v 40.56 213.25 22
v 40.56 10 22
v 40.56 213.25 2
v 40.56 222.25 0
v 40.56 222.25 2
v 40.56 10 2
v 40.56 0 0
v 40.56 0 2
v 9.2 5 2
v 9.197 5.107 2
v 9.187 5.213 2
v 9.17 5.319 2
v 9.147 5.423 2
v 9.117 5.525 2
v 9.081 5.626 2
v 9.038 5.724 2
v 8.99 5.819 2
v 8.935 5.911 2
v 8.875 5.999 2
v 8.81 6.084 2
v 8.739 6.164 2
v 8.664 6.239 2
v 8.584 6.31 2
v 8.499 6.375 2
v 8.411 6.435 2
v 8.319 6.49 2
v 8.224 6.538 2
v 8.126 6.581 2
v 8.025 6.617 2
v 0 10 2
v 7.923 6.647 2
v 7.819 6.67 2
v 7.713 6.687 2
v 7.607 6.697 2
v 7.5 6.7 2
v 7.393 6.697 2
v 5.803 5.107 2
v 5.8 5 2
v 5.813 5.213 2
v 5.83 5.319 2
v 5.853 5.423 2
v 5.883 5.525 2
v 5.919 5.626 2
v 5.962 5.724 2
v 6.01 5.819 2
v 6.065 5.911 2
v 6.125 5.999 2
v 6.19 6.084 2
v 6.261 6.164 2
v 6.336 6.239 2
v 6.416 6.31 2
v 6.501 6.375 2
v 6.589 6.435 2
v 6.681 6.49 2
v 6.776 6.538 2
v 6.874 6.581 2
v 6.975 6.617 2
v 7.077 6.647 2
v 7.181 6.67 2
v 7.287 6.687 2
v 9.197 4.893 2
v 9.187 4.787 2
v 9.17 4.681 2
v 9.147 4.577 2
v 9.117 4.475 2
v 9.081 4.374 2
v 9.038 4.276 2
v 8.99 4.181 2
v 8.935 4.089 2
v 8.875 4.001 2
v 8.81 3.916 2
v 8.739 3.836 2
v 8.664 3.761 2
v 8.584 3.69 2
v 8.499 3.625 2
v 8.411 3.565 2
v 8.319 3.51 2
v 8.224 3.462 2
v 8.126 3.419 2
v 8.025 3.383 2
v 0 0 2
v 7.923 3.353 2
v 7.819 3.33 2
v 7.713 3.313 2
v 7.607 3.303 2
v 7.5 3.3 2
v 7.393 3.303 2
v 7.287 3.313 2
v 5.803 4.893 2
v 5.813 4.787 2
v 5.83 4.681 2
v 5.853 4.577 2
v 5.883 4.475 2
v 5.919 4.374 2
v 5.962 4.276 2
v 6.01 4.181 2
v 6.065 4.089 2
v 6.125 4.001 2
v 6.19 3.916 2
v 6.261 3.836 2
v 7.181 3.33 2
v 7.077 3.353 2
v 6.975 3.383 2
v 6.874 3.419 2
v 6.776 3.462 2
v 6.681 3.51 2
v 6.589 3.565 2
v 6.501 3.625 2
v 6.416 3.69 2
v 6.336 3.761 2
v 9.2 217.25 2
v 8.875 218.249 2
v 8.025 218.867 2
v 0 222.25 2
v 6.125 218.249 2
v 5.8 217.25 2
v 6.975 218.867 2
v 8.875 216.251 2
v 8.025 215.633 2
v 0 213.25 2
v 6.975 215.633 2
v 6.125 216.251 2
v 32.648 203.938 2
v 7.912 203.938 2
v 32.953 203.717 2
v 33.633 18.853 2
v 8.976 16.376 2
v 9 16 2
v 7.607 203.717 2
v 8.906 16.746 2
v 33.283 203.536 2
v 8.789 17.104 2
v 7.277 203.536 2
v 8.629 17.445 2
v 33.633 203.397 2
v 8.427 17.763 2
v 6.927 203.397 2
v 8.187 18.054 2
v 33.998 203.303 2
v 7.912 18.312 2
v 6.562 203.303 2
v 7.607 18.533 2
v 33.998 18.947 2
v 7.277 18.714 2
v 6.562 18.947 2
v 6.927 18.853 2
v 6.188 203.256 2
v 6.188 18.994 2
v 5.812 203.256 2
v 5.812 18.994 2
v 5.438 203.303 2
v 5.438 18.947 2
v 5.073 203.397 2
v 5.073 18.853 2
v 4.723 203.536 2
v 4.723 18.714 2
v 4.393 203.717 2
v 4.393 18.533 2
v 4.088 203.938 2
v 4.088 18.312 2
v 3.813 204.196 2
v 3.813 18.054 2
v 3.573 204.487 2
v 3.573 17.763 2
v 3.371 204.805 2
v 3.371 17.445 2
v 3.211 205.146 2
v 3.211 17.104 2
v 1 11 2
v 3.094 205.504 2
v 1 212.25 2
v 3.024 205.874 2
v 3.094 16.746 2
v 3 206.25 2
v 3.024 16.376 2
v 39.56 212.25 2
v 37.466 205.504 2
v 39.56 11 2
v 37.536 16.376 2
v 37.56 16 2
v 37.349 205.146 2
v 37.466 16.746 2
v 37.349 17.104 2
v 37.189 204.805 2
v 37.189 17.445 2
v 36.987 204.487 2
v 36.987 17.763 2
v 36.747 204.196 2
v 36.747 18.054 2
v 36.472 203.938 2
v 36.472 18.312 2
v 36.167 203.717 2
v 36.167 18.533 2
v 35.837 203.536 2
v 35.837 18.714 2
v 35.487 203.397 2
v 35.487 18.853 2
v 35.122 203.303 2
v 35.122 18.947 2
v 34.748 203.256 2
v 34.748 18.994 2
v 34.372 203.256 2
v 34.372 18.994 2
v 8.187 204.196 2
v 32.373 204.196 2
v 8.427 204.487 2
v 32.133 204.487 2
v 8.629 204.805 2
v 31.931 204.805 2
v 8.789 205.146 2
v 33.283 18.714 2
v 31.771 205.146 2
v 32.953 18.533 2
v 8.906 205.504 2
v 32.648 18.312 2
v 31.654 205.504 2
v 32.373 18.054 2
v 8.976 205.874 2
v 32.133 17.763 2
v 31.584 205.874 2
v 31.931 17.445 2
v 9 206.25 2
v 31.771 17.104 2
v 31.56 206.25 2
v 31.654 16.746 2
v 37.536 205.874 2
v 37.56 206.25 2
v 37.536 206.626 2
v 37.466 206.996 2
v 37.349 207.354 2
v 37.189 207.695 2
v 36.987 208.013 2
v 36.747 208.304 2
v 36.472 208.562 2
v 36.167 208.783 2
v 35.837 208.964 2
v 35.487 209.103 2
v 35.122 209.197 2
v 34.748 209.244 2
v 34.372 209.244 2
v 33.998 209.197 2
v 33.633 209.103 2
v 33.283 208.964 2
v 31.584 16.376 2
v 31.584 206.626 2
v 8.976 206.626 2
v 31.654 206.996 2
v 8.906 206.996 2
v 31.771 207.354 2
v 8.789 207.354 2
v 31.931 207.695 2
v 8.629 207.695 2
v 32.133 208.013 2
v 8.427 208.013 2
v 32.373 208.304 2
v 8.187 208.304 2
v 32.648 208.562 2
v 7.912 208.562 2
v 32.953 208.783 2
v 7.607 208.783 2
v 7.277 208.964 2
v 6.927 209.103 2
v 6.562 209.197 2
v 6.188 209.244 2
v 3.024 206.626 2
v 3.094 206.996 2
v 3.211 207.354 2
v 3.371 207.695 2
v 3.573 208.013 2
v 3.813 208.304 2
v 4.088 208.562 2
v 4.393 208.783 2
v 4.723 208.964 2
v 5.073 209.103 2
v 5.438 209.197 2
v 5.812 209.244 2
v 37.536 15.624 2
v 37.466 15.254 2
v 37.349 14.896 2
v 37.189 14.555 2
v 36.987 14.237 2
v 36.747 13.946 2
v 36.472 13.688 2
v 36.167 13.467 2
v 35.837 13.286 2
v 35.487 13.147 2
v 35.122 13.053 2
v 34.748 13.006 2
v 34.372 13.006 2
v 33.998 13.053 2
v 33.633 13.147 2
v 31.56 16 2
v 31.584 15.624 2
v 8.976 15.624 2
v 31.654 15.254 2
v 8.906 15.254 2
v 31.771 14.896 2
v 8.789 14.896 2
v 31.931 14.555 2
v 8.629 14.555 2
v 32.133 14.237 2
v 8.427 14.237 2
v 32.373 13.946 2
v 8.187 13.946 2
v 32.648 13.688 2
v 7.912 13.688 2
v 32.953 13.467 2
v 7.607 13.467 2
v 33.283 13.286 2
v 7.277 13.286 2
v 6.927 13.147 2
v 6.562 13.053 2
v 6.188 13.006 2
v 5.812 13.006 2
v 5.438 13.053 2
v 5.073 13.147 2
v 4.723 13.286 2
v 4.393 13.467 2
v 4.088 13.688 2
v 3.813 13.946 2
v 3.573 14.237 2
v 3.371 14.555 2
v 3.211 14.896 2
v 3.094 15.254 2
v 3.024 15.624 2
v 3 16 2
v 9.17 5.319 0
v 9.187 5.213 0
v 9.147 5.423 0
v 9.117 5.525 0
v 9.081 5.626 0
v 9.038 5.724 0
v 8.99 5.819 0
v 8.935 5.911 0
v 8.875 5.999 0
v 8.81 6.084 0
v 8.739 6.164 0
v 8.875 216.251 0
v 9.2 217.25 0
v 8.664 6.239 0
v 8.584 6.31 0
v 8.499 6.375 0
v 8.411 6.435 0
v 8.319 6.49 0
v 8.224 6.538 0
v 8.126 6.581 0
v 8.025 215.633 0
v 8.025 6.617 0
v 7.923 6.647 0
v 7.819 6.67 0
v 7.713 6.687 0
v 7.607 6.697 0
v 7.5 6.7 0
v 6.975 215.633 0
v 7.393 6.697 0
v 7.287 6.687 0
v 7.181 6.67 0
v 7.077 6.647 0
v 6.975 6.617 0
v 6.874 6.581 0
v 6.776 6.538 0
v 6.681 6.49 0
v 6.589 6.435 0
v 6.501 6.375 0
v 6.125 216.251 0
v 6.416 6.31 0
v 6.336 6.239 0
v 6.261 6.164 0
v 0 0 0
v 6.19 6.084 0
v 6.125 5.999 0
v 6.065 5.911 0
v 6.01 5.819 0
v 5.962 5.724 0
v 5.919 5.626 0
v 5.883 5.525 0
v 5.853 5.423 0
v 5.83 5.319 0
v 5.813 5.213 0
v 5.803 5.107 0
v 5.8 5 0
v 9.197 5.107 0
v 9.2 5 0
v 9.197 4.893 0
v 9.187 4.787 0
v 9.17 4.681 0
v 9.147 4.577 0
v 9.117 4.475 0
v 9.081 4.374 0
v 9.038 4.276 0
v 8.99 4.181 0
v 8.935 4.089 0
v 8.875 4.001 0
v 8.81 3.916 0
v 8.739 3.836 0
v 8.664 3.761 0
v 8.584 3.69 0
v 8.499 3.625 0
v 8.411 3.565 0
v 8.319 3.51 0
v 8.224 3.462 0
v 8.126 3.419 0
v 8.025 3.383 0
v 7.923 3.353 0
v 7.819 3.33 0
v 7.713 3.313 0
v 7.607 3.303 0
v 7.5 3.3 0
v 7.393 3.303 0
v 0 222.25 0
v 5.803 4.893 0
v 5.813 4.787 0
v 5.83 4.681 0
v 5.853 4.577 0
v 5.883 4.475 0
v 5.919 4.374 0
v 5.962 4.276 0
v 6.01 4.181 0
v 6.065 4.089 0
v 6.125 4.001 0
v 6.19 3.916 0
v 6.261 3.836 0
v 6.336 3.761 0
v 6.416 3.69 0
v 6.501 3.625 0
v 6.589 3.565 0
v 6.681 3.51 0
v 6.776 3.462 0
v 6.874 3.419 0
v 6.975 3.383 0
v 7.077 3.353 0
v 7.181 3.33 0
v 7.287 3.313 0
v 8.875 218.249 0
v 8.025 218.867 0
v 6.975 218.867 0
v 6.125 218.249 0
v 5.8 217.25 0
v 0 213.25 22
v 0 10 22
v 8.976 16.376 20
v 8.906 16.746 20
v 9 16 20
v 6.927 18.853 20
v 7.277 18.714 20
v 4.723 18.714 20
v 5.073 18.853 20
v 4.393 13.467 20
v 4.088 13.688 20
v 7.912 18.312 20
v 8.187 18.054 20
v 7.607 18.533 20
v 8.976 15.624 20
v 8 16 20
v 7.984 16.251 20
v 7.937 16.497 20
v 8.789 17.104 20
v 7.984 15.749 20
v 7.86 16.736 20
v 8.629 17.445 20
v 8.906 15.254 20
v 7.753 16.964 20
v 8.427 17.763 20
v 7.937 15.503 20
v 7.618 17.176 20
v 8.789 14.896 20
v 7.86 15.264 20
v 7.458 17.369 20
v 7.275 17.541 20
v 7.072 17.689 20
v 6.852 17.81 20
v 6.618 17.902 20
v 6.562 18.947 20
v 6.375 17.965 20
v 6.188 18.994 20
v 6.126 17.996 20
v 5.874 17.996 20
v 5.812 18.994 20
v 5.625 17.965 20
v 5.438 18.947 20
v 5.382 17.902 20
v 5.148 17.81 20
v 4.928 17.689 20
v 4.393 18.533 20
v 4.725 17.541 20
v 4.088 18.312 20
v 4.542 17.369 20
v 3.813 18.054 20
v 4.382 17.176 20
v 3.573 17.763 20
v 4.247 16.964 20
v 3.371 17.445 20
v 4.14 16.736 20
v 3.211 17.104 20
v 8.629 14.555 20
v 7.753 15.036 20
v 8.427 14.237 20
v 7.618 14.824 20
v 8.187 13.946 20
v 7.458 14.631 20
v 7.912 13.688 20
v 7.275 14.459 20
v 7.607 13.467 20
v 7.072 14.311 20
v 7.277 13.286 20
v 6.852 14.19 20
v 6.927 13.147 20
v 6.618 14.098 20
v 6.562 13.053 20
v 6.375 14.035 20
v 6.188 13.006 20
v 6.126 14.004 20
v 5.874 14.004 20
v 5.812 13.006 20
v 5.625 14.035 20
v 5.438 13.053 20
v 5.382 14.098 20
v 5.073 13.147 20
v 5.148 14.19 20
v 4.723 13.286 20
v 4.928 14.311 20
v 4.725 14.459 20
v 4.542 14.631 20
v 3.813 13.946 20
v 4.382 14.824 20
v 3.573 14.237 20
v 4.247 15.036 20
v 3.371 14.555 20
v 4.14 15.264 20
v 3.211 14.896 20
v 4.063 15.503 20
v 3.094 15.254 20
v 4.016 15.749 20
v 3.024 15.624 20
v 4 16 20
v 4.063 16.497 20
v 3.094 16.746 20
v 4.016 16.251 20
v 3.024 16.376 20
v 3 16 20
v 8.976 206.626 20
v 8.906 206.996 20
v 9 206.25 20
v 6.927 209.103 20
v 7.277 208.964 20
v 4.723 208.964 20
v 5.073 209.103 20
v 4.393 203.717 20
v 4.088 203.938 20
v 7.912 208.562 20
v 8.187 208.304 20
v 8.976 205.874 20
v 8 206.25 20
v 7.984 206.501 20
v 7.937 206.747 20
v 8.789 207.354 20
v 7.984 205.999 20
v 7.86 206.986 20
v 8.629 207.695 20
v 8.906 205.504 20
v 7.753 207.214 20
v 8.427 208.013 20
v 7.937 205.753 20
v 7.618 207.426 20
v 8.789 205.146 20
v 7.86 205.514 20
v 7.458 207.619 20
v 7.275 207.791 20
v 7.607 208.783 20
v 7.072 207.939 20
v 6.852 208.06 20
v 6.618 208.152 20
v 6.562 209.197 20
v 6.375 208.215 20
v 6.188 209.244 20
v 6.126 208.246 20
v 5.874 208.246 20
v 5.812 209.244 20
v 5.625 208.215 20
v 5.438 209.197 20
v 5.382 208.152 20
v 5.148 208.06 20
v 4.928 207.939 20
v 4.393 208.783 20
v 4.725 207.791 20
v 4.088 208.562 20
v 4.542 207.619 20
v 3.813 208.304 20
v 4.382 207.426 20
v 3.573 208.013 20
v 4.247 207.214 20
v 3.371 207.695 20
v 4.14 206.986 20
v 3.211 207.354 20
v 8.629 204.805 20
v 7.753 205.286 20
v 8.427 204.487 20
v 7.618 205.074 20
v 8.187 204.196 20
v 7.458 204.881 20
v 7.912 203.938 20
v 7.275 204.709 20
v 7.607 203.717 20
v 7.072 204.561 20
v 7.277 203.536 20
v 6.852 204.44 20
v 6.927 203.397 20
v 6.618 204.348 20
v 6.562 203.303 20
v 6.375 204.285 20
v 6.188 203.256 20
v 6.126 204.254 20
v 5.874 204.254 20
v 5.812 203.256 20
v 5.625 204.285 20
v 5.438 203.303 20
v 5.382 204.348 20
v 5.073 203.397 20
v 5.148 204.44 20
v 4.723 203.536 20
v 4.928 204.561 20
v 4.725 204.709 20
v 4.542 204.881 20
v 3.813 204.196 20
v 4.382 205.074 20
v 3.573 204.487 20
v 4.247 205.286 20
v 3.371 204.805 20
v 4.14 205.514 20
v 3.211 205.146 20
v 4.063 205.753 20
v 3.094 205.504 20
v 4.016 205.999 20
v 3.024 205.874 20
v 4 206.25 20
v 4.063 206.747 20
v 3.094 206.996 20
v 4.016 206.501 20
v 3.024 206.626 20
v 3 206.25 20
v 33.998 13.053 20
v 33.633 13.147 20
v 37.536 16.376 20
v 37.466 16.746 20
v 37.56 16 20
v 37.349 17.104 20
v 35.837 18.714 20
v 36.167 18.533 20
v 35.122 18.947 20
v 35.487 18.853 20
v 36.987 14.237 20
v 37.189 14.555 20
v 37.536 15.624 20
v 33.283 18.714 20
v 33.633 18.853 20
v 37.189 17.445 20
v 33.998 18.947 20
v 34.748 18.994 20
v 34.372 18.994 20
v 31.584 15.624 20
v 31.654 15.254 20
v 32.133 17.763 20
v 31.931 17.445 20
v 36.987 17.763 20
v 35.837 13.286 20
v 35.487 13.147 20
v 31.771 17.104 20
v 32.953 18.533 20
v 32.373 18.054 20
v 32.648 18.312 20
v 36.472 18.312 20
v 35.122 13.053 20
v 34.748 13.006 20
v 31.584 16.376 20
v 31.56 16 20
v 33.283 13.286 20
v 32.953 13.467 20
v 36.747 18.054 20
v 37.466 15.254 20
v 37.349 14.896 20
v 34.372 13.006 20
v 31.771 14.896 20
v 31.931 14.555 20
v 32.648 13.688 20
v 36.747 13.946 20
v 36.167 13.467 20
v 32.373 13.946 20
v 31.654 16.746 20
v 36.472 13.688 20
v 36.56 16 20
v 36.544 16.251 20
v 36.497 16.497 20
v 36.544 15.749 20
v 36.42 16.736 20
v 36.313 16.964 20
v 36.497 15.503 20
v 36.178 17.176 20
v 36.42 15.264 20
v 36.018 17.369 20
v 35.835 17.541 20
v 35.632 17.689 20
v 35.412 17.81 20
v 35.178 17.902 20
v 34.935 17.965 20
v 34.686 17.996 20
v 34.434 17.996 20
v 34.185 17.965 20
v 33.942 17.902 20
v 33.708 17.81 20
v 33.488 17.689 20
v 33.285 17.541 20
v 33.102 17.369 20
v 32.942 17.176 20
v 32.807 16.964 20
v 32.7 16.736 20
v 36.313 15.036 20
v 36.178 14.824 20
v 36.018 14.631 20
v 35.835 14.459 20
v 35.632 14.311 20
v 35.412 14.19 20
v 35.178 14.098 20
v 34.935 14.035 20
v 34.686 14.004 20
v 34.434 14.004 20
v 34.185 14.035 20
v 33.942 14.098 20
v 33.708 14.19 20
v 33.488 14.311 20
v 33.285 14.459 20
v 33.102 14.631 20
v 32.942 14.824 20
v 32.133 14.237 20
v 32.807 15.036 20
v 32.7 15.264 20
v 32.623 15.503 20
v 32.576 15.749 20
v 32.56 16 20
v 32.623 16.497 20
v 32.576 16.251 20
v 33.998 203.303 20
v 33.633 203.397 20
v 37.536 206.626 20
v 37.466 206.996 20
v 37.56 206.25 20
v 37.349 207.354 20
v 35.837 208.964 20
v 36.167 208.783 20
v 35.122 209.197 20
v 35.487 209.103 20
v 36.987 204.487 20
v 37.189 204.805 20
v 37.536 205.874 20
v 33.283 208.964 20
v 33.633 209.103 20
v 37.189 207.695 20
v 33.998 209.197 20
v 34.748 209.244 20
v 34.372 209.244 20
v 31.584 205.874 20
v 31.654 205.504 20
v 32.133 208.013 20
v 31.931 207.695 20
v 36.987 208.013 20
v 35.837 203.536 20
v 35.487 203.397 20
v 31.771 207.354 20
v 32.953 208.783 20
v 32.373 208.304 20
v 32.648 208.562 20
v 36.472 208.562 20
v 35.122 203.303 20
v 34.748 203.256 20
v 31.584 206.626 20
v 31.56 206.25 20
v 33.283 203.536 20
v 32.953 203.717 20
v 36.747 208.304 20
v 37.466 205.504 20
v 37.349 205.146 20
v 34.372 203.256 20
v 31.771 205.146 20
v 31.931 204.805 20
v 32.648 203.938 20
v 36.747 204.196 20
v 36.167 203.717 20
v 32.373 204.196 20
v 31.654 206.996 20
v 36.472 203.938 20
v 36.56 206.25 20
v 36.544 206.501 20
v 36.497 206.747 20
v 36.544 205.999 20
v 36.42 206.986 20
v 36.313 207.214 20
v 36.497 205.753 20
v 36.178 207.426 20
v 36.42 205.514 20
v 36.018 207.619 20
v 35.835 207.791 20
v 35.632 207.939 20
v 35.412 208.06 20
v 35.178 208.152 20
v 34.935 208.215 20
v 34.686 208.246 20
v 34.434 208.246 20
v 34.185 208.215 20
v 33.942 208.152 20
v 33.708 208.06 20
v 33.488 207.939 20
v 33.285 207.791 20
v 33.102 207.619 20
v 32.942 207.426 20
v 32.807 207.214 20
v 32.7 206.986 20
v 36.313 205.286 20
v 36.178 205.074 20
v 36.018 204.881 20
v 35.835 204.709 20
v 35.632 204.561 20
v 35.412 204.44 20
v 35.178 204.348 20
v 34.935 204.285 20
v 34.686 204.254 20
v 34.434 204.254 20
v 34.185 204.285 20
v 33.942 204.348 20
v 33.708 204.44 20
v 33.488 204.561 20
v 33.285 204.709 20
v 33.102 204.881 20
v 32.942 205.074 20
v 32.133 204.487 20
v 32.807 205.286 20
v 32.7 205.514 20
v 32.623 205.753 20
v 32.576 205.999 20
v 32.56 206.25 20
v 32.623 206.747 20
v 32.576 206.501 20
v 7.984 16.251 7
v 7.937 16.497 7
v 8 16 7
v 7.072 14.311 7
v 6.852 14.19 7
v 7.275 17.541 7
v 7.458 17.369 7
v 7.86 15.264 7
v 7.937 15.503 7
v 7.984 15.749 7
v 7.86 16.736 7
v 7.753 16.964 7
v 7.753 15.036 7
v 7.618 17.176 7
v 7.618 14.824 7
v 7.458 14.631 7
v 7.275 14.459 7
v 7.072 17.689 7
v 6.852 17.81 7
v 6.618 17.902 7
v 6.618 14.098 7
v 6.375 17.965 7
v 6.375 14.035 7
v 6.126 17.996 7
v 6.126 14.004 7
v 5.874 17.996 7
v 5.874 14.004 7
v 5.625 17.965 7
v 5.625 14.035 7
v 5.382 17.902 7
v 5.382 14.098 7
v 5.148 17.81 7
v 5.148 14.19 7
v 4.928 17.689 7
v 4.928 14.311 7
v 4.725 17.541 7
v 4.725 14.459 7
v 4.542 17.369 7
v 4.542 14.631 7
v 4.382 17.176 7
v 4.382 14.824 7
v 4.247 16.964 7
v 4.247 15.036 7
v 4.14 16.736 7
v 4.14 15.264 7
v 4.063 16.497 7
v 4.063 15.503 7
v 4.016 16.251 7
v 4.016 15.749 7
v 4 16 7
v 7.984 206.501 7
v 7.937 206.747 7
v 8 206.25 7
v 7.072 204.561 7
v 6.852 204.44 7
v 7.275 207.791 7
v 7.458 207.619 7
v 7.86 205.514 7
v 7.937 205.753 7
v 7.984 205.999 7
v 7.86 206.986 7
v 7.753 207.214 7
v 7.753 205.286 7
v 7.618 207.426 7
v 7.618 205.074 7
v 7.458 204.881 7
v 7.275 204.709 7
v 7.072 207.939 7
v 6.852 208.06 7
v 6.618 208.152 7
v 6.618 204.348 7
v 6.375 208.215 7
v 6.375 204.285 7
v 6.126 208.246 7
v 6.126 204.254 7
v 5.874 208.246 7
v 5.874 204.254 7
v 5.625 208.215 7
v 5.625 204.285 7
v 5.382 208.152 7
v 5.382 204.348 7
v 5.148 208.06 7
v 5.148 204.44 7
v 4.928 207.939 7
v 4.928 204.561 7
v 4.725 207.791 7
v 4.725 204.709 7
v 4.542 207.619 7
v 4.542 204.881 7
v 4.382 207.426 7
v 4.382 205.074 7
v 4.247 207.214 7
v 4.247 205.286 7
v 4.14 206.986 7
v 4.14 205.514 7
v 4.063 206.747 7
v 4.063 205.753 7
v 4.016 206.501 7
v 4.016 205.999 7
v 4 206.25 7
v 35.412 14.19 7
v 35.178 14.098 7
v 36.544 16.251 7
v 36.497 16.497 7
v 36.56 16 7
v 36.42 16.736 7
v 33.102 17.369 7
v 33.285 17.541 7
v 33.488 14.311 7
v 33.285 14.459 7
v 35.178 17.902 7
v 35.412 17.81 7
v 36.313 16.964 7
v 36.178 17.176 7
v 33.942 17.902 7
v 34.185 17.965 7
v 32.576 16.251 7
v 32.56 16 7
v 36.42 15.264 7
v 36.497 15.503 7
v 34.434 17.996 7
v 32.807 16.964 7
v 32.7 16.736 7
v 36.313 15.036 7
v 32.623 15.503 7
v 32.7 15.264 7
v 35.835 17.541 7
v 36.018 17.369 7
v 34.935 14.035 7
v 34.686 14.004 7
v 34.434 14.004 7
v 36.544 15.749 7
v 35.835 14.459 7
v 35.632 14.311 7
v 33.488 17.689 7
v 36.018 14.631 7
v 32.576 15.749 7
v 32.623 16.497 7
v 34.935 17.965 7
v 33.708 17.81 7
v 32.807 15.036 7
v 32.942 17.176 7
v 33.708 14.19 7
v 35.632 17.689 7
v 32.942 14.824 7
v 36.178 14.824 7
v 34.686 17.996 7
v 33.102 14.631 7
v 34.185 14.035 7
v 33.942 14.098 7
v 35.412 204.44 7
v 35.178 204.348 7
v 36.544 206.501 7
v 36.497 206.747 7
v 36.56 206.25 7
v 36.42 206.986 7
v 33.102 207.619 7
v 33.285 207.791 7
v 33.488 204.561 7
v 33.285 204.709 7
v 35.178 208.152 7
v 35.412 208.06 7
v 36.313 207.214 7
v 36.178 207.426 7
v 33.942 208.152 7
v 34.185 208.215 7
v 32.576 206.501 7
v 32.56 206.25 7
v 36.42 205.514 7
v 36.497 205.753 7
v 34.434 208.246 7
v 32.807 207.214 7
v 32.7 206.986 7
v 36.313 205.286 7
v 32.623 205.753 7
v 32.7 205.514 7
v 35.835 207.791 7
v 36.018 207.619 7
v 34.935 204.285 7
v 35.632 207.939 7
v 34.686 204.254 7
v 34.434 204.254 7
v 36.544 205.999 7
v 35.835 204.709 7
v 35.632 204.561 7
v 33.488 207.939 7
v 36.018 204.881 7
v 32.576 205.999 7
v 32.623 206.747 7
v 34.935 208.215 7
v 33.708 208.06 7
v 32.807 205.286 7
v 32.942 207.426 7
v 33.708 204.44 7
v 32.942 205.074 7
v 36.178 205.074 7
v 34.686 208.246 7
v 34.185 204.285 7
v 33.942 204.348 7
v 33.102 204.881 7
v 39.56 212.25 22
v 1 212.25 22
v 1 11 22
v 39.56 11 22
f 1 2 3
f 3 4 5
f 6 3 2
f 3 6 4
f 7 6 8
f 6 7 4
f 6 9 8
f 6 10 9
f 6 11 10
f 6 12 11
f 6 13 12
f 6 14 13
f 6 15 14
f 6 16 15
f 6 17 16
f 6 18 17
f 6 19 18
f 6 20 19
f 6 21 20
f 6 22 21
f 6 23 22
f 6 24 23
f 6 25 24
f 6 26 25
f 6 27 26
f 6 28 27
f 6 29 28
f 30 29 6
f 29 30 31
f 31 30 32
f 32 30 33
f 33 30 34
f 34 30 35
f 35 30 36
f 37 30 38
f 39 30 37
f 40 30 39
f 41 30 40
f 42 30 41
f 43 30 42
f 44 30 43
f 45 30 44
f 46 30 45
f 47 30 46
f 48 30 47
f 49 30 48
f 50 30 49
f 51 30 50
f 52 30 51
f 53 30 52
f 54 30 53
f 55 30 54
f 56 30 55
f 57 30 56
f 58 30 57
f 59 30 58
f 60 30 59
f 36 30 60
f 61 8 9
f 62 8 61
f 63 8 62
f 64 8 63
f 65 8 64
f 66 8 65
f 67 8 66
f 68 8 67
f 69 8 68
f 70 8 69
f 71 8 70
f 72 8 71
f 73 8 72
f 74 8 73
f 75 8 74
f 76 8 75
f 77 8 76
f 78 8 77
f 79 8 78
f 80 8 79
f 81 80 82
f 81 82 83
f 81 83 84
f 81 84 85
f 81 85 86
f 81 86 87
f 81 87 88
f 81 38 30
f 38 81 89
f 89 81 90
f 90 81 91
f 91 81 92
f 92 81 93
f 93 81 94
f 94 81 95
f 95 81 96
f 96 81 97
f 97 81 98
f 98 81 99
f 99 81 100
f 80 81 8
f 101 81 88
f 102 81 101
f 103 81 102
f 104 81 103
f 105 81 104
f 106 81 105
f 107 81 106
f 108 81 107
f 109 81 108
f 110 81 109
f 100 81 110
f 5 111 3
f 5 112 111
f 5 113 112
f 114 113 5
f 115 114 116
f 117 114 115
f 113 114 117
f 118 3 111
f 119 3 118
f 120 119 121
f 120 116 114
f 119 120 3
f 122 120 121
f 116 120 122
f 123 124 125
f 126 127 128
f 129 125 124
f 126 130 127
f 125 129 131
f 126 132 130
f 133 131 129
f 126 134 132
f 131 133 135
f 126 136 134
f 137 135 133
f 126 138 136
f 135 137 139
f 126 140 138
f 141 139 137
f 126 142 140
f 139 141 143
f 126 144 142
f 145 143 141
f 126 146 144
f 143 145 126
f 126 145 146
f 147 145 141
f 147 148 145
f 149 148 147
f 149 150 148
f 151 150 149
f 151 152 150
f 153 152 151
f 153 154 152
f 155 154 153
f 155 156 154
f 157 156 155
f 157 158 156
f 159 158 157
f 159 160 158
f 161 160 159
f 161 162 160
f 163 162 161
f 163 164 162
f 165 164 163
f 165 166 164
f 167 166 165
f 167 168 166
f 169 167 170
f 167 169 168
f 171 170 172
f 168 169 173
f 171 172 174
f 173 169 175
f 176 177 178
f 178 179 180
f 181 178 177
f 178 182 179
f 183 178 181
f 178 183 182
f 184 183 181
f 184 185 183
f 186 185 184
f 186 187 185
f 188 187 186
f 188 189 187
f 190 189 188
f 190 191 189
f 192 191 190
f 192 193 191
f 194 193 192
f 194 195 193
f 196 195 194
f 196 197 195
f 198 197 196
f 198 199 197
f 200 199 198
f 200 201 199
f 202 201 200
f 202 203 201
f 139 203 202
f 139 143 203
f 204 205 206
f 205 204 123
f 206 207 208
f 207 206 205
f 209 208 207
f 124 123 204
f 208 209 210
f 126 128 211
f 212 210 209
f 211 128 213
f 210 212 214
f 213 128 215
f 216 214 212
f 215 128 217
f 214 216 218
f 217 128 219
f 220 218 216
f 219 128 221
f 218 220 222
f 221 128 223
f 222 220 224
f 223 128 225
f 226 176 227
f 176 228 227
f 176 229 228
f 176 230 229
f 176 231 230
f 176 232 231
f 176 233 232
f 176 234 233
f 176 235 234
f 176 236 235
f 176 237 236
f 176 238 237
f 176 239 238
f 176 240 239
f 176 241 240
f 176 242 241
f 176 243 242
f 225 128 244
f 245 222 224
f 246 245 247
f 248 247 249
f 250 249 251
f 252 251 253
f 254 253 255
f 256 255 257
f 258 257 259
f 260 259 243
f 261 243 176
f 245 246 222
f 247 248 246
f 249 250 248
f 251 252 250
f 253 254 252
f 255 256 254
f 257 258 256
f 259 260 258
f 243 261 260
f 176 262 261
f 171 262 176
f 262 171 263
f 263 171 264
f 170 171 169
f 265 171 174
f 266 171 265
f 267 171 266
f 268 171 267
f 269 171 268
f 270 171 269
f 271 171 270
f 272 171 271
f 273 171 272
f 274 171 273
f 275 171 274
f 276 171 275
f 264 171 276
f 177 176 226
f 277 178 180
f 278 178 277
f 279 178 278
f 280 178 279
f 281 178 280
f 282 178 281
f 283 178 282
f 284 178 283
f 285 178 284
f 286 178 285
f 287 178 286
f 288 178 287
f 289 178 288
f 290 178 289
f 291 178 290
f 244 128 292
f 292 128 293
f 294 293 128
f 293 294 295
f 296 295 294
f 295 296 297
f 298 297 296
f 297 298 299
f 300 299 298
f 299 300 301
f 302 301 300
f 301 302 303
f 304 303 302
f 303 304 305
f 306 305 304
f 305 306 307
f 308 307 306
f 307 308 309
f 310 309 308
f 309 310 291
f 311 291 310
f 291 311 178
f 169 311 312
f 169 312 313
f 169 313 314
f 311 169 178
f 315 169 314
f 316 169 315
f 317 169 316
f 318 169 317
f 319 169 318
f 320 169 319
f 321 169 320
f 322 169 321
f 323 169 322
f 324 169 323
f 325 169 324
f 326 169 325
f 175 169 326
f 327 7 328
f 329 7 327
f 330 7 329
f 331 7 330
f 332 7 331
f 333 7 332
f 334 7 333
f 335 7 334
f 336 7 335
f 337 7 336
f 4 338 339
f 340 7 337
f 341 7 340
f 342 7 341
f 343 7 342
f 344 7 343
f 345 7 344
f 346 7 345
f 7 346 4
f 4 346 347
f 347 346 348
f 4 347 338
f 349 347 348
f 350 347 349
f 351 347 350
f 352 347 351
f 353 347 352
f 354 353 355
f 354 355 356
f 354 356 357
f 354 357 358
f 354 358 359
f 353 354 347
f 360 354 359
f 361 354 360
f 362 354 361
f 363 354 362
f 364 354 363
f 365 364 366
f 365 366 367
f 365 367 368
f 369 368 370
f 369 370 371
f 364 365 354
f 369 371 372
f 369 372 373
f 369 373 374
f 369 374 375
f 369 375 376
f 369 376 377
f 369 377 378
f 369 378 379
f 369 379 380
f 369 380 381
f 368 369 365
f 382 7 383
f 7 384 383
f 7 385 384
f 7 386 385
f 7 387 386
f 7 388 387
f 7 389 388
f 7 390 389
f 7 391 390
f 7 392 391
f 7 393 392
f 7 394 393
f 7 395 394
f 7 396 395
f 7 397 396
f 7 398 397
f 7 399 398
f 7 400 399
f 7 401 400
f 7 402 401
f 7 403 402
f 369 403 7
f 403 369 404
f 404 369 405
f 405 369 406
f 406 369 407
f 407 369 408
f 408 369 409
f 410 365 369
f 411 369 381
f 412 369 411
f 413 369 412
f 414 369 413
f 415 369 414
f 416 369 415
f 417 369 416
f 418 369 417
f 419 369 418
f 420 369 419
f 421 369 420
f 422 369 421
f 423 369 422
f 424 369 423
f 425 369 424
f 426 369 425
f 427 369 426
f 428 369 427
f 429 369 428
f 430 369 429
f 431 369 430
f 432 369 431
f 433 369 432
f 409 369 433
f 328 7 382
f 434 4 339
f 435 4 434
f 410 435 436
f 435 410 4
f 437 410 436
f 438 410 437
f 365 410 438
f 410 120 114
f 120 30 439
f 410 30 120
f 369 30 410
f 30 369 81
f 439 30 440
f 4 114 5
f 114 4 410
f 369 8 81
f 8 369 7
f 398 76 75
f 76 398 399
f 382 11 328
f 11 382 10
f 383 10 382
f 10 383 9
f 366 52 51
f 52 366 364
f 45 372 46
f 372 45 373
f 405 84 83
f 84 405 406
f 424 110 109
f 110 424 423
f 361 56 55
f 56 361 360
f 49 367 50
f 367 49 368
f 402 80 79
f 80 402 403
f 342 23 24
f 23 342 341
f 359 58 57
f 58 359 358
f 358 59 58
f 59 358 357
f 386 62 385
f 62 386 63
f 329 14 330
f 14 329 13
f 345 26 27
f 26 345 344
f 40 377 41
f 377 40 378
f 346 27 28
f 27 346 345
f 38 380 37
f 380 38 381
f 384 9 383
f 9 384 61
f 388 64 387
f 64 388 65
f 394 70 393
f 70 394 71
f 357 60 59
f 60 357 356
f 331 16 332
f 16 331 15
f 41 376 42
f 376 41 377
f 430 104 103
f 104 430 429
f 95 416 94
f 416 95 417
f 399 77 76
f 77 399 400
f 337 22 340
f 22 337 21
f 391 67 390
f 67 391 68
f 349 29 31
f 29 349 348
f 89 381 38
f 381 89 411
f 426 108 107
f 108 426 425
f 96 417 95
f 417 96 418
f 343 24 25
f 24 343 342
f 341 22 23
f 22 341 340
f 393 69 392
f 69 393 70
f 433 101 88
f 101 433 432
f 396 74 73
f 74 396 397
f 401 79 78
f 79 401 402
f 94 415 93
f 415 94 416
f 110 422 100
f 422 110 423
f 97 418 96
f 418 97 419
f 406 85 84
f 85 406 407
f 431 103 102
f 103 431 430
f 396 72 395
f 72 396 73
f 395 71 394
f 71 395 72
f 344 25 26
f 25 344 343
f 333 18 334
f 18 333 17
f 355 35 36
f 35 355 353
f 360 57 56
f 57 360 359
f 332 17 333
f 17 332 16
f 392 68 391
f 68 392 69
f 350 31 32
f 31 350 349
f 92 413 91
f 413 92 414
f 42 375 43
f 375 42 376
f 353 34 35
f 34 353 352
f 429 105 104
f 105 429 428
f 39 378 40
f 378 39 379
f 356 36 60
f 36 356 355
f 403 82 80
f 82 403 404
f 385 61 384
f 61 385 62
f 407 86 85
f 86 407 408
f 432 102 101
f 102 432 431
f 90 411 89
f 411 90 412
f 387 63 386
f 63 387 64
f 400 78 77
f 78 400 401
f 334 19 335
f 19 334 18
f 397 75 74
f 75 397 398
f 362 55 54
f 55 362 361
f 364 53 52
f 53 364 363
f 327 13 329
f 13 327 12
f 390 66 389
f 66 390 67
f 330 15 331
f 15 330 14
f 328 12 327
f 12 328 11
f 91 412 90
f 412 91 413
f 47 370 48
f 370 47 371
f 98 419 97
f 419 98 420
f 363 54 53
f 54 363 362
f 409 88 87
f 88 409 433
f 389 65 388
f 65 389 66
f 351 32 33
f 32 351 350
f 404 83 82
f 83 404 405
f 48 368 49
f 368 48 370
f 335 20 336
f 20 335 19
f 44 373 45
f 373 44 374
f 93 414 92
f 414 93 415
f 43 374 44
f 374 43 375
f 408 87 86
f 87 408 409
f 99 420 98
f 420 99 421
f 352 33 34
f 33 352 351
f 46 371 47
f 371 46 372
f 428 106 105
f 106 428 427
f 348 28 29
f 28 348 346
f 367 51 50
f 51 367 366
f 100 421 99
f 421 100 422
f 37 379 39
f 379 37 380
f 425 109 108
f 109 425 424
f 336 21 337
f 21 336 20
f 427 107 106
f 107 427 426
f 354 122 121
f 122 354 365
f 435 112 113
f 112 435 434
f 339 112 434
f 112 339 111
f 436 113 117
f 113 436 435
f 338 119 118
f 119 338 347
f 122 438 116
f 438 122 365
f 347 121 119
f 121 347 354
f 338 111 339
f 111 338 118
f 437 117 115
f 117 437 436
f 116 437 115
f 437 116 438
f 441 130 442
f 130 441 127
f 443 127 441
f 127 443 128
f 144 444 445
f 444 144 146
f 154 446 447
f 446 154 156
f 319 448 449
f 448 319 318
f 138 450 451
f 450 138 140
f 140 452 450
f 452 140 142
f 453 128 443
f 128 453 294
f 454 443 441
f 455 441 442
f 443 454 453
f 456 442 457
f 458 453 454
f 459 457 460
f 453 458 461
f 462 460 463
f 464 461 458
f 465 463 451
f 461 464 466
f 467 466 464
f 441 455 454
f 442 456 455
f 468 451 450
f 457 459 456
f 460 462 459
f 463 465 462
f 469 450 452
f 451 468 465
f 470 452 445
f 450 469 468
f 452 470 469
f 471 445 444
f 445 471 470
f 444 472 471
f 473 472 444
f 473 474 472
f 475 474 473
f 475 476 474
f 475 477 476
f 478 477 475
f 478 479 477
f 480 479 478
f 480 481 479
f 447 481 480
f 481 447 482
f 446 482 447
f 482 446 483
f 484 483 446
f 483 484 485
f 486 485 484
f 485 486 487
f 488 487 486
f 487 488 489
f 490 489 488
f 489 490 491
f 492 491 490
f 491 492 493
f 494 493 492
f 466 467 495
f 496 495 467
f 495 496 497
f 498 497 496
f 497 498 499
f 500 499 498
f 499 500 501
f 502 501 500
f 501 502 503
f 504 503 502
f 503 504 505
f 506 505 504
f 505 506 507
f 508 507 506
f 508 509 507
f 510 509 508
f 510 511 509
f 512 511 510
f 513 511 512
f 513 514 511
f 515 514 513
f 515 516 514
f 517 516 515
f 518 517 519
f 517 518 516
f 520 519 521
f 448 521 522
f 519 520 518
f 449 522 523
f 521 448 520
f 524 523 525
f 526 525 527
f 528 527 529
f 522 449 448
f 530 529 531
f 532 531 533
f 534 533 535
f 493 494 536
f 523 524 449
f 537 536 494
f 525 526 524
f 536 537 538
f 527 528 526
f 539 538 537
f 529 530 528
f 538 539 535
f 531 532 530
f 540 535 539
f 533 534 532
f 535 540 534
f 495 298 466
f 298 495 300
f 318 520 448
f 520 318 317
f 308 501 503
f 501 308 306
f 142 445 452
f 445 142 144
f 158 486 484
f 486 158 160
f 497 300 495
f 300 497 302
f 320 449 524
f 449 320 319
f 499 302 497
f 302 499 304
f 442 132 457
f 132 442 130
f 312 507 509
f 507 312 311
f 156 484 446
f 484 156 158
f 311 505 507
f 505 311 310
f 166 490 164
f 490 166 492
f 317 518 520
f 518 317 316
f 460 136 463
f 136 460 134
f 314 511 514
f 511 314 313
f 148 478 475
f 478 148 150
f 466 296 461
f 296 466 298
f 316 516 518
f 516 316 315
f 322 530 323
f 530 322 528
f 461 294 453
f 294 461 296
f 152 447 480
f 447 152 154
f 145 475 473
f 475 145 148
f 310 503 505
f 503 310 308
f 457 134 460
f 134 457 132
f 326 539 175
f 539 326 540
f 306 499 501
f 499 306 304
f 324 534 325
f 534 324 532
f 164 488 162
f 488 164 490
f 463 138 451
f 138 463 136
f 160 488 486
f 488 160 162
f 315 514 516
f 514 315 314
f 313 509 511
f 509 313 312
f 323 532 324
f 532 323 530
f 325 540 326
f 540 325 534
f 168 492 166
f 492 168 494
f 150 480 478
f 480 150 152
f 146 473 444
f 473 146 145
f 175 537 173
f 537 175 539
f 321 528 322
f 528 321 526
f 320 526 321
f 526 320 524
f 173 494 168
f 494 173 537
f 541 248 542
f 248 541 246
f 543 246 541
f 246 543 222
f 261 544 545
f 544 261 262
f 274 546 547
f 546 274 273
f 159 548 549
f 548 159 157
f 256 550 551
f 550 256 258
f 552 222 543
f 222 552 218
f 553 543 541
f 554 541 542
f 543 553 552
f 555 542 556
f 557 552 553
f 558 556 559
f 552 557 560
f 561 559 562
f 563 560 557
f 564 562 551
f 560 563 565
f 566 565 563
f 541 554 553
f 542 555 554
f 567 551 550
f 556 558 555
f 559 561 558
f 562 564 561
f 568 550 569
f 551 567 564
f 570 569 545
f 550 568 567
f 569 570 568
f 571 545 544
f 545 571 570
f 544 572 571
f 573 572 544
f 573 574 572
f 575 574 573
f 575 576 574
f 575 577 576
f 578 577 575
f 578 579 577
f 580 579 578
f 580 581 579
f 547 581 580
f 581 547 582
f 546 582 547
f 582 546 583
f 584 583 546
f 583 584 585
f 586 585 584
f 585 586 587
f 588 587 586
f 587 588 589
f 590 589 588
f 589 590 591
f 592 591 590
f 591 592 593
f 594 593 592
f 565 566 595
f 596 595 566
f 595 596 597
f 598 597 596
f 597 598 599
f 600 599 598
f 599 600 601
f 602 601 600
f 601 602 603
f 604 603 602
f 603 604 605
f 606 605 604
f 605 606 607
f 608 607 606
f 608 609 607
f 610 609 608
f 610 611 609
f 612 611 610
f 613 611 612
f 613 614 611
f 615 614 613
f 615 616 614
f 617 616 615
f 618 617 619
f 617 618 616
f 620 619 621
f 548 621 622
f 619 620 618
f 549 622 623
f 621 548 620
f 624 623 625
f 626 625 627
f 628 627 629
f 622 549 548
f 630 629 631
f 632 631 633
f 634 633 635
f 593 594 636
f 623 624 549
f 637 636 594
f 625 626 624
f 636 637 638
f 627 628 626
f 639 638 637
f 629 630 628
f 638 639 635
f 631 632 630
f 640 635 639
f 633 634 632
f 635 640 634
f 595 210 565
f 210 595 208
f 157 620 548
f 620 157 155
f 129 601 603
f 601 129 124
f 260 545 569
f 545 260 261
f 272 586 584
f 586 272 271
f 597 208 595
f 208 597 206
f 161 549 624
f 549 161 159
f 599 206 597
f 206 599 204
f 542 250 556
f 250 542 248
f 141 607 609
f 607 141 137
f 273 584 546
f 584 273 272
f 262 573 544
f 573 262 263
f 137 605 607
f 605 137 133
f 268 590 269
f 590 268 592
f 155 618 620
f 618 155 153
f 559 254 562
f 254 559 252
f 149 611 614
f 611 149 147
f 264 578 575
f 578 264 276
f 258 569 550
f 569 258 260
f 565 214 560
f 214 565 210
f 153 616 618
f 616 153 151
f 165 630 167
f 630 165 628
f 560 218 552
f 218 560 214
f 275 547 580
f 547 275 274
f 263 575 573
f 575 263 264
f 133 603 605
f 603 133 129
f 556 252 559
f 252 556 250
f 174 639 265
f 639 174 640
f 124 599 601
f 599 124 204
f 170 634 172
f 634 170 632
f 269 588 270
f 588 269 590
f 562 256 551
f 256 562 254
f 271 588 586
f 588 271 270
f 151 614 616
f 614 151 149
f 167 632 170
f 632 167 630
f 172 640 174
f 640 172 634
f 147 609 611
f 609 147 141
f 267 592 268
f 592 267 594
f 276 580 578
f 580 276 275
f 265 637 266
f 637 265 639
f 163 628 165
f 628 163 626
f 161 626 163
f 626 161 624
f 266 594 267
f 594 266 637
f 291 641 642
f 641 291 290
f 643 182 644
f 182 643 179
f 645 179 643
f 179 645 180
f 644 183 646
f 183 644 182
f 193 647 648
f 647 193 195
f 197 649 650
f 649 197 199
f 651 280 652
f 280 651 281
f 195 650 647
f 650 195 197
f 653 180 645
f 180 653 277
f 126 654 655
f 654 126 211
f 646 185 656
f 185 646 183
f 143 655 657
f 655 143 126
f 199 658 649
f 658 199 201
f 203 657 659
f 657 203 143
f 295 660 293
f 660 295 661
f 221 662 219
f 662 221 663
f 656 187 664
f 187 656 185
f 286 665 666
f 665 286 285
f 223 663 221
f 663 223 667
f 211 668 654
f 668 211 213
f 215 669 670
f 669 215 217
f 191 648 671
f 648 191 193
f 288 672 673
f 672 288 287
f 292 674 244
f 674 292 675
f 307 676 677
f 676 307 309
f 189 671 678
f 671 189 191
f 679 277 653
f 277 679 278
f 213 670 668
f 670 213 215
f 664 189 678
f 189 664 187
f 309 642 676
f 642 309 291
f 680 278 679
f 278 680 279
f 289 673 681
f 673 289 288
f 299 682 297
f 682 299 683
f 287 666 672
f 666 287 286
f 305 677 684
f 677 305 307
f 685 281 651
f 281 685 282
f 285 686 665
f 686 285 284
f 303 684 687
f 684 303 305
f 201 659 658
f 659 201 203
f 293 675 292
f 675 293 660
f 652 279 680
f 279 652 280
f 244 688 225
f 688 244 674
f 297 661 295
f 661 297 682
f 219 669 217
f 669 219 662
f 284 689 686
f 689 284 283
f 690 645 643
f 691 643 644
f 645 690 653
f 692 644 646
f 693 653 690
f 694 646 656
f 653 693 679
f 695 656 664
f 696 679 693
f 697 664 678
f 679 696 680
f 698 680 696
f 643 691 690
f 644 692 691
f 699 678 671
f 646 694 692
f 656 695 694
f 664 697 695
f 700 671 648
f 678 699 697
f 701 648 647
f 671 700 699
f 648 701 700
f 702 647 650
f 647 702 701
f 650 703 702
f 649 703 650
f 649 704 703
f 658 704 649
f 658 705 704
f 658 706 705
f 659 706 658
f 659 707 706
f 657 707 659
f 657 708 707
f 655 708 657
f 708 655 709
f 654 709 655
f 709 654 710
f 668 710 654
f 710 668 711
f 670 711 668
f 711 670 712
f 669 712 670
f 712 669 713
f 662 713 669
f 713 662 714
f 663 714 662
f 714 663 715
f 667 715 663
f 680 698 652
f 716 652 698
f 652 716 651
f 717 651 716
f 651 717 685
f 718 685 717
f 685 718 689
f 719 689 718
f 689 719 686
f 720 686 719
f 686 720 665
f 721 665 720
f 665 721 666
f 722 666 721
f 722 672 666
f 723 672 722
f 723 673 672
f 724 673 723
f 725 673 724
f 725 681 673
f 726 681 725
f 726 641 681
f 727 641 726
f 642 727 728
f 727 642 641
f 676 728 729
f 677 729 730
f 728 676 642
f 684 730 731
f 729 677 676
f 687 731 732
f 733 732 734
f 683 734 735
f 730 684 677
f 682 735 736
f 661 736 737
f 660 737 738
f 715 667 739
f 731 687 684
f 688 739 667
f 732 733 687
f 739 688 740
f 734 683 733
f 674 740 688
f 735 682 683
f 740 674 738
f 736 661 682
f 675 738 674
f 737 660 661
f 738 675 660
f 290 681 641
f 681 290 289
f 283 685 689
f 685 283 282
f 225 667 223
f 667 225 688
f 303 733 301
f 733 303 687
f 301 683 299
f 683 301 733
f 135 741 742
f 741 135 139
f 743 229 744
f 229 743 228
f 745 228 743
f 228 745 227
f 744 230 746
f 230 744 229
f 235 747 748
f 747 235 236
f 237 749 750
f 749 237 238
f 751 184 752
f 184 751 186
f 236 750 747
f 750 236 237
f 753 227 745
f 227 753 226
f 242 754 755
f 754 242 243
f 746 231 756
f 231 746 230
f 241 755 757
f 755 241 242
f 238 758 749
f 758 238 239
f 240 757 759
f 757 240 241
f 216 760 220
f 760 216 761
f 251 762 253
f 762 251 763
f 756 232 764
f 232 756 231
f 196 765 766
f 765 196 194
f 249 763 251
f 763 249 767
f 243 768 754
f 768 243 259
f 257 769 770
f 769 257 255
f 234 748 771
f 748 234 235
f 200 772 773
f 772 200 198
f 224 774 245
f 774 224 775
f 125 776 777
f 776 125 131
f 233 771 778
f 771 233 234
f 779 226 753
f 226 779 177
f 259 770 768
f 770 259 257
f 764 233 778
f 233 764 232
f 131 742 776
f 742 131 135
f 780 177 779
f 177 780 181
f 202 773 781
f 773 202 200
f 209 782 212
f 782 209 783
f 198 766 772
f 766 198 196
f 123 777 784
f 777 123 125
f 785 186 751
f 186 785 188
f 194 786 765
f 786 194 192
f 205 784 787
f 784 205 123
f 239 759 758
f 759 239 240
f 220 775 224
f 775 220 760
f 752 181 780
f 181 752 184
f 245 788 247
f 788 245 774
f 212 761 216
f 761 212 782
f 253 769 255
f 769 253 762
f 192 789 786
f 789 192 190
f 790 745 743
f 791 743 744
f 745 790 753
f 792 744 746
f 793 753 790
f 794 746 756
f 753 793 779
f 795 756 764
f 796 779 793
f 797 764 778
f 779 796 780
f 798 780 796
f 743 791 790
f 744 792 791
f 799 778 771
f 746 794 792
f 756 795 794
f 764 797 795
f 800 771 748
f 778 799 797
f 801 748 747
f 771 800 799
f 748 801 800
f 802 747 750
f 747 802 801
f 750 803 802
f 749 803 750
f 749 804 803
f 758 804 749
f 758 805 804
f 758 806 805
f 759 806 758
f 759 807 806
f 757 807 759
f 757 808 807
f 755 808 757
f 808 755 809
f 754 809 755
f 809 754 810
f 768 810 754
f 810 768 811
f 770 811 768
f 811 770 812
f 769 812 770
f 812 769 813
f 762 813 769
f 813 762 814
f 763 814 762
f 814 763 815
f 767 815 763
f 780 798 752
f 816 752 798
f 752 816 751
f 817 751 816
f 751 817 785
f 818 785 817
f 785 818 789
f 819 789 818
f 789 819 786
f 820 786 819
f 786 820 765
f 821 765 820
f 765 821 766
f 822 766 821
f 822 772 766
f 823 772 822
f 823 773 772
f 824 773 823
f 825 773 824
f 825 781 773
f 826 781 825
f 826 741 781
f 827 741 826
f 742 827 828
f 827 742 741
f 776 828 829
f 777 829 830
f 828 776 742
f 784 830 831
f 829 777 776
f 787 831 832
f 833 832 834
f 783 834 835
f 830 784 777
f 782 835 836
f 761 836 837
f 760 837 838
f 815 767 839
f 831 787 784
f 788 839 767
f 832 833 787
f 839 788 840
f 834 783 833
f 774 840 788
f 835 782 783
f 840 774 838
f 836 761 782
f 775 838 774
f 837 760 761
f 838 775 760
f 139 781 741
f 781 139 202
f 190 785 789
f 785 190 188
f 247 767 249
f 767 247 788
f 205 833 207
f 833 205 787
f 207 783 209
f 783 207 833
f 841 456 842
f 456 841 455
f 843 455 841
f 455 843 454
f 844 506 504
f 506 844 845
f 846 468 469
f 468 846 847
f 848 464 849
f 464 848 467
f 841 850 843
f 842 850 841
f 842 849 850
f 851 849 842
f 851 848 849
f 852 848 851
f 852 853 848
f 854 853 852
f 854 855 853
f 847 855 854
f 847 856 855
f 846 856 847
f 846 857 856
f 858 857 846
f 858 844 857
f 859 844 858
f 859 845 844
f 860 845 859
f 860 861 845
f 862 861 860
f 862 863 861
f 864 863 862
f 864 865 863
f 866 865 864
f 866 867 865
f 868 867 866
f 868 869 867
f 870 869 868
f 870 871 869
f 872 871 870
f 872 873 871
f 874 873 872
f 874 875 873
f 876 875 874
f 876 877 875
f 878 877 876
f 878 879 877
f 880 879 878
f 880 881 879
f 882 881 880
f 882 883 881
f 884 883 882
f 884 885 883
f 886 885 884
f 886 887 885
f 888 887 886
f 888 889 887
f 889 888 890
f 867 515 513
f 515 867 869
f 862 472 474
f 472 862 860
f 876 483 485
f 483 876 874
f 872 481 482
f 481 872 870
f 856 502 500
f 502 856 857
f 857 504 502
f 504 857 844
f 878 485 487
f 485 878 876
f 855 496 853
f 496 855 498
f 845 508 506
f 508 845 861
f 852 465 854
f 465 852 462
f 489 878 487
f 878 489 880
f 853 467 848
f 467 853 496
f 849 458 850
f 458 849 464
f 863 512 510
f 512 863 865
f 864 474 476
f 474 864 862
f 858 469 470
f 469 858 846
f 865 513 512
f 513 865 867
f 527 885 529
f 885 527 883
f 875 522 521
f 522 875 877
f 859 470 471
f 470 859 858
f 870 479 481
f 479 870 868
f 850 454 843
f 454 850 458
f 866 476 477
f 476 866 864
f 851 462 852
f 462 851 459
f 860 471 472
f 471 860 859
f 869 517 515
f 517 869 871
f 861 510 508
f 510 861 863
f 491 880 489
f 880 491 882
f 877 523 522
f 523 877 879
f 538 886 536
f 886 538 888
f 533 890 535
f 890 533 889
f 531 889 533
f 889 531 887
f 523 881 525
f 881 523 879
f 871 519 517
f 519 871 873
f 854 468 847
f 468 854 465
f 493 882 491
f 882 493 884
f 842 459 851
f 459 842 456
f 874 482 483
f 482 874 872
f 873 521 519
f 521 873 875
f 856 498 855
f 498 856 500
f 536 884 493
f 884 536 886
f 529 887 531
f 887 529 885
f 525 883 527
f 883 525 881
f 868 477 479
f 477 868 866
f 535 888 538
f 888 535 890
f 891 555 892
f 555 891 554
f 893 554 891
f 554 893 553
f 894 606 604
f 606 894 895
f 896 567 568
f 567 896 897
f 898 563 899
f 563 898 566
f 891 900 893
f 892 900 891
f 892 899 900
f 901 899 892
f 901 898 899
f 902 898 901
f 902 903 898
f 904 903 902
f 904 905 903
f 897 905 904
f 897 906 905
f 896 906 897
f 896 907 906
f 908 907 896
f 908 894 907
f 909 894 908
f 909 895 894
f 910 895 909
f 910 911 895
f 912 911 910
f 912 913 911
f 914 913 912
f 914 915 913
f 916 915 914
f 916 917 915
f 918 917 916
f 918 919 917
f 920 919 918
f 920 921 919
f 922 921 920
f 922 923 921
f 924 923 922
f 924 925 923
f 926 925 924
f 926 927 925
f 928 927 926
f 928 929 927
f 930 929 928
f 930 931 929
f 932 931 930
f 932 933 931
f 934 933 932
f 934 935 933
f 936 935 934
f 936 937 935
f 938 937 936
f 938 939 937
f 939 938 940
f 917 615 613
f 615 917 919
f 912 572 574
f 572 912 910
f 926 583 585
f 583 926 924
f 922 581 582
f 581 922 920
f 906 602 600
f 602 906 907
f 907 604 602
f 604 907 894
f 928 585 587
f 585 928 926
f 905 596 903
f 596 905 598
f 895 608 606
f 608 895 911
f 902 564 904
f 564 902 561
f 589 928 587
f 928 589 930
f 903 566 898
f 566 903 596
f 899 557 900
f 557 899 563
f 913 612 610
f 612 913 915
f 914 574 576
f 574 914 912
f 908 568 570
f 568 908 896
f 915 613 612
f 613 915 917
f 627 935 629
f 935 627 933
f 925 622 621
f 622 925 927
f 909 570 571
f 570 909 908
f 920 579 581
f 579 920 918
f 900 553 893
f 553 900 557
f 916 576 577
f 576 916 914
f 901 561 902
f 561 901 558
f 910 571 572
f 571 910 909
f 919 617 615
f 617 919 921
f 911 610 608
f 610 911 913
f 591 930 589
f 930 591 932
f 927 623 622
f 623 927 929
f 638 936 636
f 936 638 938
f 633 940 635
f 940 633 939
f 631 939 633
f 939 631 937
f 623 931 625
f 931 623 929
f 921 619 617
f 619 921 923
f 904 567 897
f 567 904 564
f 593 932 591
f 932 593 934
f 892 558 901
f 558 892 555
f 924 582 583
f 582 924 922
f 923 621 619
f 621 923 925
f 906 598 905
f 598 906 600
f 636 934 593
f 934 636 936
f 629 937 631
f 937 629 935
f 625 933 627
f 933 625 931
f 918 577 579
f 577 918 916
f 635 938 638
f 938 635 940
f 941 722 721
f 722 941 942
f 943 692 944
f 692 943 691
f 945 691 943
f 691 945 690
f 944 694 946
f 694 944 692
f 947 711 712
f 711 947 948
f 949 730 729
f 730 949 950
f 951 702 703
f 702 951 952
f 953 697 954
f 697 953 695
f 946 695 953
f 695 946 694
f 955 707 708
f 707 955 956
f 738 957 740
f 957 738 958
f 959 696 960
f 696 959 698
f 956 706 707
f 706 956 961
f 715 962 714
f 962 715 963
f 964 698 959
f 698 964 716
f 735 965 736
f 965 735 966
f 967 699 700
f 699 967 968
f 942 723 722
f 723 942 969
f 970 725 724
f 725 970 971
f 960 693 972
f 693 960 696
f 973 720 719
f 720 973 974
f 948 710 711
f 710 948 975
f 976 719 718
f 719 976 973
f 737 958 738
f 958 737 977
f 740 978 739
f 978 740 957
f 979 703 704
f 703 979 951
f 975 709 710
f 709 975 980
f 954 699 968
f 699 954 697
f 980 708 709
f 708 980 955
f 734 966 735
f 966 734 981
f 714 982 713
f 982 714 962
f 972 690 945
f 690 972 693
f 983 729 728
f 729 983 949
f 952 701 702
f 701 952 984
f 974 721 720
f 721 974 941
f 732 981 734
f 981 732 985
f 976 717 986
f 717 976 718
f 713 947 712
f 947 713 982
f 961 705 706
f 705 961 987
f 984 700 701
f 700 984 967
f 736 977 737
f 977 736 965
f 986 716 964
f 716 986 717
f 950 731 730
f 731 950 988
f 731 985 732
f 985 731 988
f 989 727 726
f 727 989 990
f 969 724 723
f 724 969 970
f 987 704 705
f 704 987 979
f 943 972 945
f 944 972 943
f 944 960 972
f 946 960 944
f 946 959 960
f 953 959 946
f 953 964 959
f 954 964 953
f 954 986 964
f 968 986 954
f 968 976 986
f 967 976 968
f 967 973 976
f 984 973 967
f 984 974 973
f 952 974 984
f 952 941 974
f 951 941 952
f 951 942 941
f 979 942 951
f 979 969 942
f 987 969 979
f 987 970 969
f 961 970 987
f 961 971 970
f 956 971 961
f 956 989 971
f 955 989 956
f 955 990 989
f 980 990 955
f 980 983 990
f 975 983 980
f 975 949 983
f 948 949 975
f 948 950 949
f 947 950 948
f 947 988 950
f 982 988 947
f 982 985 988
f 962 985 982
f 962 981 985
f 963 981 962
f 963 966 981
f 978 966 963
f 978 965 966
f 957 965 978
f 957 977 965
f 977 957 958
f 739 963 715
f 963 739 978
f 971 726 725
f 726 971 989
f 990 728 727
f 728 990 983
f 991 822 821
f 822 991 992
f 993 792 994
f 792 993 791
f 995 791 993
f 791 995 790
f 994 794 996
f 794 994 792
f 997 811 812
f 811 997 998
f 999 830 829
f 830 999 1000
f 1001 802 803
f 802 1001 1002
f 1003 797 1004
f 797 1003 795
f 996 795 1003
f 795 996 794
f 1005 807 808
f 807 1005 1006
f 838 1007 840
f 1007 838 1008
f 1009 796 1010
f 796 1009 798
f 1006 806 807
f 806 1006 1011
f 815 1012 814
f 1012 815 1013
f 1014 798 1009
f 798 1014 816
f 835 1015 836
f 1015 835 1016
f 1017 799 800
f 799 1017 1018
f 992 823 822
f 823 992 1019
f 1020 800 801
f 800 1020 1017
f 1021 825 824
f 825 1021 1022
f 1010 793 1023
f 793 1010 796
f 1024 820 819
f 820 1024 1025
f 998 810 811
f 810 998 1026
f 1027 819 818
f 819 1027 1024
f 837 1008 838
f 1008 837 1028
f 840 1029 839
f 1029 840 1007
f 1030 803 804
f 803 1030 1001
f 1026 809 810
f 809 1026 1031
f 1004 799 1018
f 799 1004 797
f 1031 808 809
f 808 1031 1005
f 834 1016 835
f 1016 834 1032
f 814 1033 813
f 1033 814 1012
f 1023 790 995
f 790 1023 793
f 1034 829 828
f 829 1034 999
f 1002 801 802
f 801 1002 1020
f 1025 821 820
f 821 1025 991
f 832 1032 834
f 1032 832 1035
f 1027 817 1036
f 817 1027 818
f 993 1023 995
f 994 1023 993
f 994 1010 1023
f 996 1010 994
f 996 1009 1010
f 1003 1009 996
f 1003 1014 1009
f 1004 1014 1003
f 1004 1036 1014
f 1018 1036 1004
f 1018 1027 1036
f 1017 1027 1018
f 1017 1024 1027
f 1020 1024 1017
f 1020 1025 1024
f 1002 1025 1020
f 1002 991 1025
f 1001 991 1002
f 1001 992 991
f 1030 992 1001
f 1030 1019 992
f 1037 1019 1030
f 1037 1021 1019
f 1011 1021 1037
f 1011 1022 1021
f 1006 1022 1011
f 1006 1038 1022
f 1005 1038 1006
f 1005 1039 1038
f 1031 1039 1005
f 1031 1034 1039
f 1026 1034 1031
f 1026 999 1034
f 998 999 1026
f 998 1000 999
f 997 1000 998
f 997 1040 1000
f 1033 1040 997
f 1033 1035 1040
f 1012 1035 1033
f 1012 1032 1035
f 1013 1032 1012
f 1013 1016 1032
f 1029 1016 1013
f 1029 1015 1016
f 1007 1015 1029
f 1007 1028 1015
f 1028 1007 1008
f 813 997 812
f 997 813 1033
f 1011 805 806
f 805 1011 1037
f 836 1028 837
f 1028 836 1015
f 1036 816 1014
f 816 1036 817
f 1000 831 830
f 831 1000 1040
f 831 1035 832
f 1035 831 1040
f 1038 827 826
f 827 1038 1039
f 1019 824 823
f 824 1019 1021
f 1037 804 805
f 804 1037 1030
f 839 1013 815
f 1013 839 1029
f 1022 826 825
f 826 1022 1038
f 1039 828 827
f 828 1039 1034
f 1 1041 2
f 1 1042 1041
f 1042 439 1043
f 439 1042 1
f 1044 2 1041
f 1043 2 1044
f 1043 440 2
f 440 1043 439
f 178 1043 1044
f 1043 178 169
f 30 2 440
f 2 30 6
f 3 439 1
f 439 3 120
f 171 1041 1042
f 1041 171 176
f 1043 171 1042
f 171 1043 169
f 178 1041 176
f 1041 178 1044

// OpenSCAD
/** 
 * The panel plate
 */

HP_SIZE = 5.07;
HU_SIZE = 44.45;
HOLE_FROM_SIDE = 7.5;
HOLE_FROM_TOP = 5;

SCREEW_R = 1.7;

BORDER=10;
WALL_HEIGHT=20;
WALL_THICKNESS=1;
STAND_R=3;
STAND_H=18;
STAND_HOLE=2;

PCB_SPACING=2;

module plate_first_layer(HP=1,HU=5,thickness=2,layer=0.3) {
	height=HU*HU_SIZE;
	width=HP*HP_SIZE;
	cube([width, height, layer]);
}

module plate(HP=1,HU=5, //size of the panel
             thickness=2, //panel thickness
             screew=SCREEW_R, //radius of the panel screw hole
             border=BORDER, //the border on top and buttom of the panel
             wall_height=WALL_HEIGHT, //side wall height
             wall_thickness=WALL_THICKNESS, //side wall thickness
             stand_r=STAND_R, //stand radius
             stand_h=STAND_H, //stand height
             stand_hole=STAND_HOLE, //stand screw hole
             pcb_spacing=PCB_SPACING // spacing between pcb and side wall
             ) {

	height=HU*HU_SIZE;
	width=HP*HP_SIZE;

	difference() {
		cube([width, height, thickness]);

		translate([HOLE_FROM_SIDE, HOLE_FROM_TOP, -1]) {
			cylinder(r=screew, h=10, $fn=100);
		}
			

		translate([HOLE_FROM_SIDE, height-HOLE_FROM_TOP, -1]) {
			cylinder(r=screew, h=10, $fn=10);
		}

		if (width > 50) {
			translate([width-HOLE_FROM_SIDE, HOLE_FROM_TOP, -1]) {
				cylinder(r=screew, h=10, $fn=10);
			}

			translate([width-HOLE_FROM_SIDE, height-HOLE_FROM_TOP, -1]) {
				cylinder(r=screew, h=10, $fn=10);
			}
		}
	}

    //draw the wall    
    translate([0,border,thickness]) cube([width, wall_thickness, wall_height]);
    translate([0,height-border,thickness]) cube([width, wall_thickness, wall_height]);
    translate([wall_thickness,border,thickness]) rotate([0,0,90]) cube([height-2*border, wall_thickness, wall_height]);
    translate([width,border,thickness]) rotate([0,0,90]) cube([height-2*border, wall_thickness, wall_height]);

    //draw the stand
    _stand_x1 = wall_thickness+stand_r+pcb_spacing;
    _stand_x2 = width-wall_thickness-stand_r-pcb_spacing;
    _stand_y1 = border+wall_thickness+stand_r++pcb_spacing;
    _stand_y2 = height-border-wall_thickness-stand_r-pcb_spacing;

    difference() {
        group() {
            translate([_stand_x1,_stand_y1,thickness]) cylinder(r=stand_r, h=stand_h, $fn=50);
            translate([_stand_x1,_stand_y2,thickness]) cylinder(r=stand_r, h=stand_h, $fn=50);
            translate([_stand_x2,_stand_y1,thickness]) cylinder(r=stand_r, h=stand_h, $fn=50);
            translate([_stand_x2,_stand_y2,thickness]) cylinder(r=stand_r, h=stand_h, $fn=50);
        }
        translate([_stand_x1,_stand_y1,thickness+5]) cylinder(r=stand_hole, h=stand_h, $fn=50);
        translate([_stand_x1,_stand_y2,thickness+5]) cylinder(r=stand_hole, h=stand_h, $fn=50);
        translate([_stand_x2,_stand_y1,thickness+5]) cylinder(r=stand_hole, h=stand_h, $fn=50);
        translate([_stand_x2,_stand_y2,thickness+5]) cylinder(r=stand_hole, h=stand_h, $fn=50);
    }
}

module perfboard(x=0,y=0,width=1,height=50,length=1,THICKNESS=20) {
    translate([x,y,height]) {
        cube([width*2.54, length*2.54, 0.3]);        
    }
}

plate(HP=8);
